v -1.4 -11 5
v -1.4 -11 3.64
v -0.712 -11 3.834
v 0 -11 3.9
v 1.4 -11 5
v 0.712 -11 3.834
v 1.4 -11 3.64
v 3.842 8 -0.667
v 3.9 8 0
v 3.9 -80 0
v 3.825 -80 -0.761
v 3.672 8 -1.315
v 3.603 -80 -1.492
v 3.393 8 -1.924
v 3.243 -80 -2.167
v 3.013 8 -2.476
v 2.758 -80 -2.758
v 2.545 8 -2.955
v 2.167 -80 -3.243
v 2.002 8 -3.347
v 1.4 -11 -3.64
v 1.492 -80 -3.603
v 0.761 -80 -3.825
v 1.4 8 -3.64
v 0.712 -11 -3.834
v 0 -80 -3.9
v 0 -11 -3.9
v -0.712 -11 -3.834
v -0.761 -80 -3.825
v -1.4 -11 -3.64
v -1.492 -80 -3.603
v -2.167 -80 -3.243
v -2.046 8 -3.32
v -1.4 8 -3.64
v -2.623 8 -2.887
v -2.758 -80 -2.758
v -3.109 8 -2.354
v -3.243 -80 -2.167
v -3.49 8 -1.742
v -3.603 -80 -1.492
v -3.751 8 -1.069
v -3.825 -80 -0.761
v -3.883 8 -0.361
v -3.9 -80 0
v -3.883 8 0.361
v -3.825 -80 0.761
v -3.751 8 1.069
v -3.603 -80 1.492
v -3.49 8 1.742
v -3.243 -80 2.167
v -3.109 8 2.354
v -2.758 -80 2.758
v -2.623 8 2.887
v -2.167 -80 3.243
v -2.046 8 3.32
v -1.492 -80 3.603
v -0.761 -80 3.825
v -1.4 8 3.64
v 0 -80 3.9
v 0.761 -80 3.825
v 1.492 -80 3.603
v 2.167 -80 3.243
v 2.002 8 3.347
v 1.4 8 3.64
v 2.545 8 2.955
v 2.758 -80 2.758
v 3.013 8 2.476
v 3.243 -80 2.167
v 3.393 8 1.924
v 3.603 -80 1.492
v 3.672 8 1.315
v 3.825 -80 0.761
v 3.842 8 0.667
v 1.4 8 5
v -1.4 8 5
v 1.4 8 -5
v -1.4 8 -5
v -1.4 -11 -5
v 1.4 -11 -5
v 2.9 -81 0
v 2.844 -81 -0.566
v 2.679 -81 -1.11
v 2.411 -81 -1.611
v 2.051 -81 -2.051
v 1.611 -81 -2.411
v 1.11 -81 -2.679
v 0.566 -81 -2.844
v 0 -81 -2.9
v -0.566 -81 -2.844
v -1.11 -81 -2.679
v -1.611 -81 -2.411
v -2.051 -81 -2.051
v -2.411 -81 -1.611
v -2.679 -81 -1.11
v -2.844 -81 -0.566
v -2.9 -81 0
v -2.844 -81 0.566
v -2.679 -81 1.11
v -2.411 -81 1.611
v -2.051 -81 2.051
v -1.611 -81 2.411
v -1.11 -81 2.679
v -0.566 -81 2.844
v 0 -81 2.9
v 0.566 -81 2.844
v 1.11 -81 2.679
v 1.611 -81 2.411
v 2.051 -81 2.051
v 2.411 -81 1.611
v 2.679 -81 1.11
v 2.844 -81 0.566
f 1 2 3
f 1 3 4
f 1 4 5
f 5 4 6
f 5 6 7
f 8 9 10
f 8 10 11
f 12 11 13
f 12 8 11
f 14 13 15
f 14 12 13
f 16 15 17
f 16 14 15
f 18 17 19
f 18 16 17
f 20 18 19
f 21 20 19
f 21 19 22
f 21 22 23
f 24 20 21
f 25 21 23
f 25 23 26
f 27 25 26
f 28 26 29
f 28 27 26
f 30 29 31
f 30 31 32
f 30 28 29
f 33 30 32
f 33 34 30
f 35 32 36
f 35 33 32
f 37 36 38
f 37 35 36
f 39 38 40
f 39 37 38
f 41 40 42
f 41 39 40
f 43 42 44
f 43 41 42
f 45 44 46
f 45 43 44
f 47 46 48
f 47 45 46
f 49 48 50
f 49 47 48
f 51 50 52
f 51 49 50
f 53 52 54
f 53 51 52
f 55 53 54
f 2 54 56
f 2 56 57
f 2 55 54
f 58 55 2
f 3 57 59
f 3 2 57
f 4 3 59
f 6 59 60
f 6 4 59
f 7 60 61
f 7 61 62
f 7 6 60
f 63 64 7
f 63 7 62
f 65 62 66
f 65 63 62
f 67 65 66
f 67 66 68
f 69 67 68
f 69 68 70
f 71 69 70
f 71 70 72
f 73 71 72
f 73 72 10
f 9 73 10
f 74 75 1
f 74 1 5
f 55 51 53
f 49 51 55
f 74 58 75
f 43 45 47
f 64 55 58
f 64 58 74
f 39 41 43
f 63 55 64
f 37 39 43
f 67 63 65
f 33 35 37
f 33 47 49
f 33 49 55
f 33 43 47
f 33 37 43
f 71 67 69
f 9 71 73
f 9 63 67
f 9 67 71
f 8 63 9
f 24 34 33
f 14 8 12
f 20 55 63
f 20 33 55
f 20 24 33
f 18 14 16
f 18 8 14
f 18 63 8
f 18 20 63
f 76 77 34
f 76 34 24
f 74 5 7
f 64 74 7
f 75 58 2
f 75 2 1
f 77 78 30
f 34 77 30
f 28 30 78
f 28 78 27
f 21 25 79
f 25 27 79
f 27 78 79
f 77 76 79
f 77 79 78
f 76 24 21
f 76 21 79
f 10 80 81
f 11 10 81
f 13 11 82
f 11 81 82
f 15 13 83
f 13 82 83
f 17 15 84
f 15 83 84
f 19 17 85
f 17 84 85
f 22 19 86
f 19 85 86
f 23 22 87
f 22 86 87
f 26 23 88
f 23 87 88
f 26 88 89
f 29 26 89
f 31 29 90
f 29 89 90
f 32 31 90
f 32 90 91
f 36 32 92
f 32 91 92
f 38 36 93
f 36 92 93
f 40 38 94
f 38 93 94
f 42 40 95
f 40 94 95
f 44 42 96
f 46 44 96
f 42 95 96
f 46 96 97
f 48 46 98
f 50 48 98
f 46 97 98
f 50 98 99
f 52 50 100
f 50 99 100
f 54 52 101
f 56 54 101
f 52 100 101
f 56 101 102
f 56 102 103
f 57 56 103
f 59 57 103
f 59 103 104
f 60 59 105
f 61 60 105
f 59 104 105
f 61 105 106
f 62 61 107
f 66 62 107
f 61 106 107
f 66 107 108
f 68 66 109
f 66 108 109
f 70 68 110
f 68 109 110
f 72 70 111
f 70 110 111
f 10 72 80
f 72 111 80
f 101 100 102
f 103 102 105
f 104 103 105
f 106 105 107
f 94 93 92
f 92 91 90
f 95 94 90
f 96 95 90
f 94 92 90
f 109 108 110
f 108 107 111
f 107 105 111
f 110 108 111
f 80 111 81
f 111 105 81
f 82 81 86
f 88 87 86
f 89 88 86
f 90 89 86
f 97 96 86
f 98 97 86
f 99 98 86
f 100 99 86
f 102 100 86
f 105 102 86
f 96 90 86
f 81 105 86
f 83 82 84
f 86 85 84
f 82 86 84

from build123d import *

# Parameters (mm, degrees)
ESQUISSE1_R             = 3.9
BOSS_EXTRU_1_DEPTH      = 8
BOSS_EXTRU_1_DEPTH_BACK = 81
BOSS_EXTRU_2_DEPTH      = 19
CHANFREIN1_SIZE         = 1


with BuildPart() as part:
    # Esquisse1 → Boss.-Extru.1 (new body, two sides)
    with BuildSketch(Plane(origin=(0, 0, 0), x_dir=(1, 0, 0), z_dir=(0, 1, 0))) as boss_extru_1_sk:
        Circle(ESQUISSE1_R)
    extrude(amount=BOSS_EXTRU_1_DEPTH)
    extrude(boss_extru_1_sk.sketch, amount=-BOSS_EXTRU_1_DEPTH_BACK)

    # Esquisse2 → Boss.-Extru.2 (add)
    with BuildSketch(Plane(origin=(0, 8, 0), x_dir=(1, 0, 0), z_dir=(0, 1, 0))):
        with BuildLine():
            Line((-1.4, 5), (-1.4, 3.640054945))
            ThreePointArc((-1.4, 3.640054945), (0, 3.9), (1.4, 3.640054945))
            Line((1.4, 3.640054945), (1.4, 5))
            Line((1.4, 5), (-1.4, 5))
        make_face()
        with BuildLine():
            ThreePointArc((1.4, -3.640054945), (0, -3.9), (-1.4, -3.640054945))
            Line((-1.4, -3.640054945), (-1.4, -5))
            Line((-1.4, -5), (1.4, -5))
            Line((1.4, -5), (1.4, -3.640054945))
        make_face()
        with BuildLine():
            Line((-1.4, 3.640054945), (-1.4, 0))
            Line((-1.4, 0), (1.4, 0))
            Line((1.4, 0), (1.4, 3.640054945))
            ThreePointArc((1.4, 3.640054945), (0, 3.9), (-1.4, 3.640054945))
        make_face()
        with BuildLine():
            Line((1.4, 0), (-1.4, 0))
            Line((-1.4, 0), (-1.4, -3.640054945))
            ThreePointArc((-1.4, -3.640054945), (0, -3.9), (1.4, -3.640054945))
            Line((1.4, -3.640054945), (1.4, 0))
        make_face()
    extrude(amount=-BOSS_EXTRU_2_DEPTH)

    # Chanfrein1
    chanfrein1_edges = [part.edges().sort_by_distance(p)[0] for p in [
        (-3.9, -81, 0),
    ]]
    chamfer(chanfrein1_edges, length=CHANFREIN1_SIZE)


solid = part.part
